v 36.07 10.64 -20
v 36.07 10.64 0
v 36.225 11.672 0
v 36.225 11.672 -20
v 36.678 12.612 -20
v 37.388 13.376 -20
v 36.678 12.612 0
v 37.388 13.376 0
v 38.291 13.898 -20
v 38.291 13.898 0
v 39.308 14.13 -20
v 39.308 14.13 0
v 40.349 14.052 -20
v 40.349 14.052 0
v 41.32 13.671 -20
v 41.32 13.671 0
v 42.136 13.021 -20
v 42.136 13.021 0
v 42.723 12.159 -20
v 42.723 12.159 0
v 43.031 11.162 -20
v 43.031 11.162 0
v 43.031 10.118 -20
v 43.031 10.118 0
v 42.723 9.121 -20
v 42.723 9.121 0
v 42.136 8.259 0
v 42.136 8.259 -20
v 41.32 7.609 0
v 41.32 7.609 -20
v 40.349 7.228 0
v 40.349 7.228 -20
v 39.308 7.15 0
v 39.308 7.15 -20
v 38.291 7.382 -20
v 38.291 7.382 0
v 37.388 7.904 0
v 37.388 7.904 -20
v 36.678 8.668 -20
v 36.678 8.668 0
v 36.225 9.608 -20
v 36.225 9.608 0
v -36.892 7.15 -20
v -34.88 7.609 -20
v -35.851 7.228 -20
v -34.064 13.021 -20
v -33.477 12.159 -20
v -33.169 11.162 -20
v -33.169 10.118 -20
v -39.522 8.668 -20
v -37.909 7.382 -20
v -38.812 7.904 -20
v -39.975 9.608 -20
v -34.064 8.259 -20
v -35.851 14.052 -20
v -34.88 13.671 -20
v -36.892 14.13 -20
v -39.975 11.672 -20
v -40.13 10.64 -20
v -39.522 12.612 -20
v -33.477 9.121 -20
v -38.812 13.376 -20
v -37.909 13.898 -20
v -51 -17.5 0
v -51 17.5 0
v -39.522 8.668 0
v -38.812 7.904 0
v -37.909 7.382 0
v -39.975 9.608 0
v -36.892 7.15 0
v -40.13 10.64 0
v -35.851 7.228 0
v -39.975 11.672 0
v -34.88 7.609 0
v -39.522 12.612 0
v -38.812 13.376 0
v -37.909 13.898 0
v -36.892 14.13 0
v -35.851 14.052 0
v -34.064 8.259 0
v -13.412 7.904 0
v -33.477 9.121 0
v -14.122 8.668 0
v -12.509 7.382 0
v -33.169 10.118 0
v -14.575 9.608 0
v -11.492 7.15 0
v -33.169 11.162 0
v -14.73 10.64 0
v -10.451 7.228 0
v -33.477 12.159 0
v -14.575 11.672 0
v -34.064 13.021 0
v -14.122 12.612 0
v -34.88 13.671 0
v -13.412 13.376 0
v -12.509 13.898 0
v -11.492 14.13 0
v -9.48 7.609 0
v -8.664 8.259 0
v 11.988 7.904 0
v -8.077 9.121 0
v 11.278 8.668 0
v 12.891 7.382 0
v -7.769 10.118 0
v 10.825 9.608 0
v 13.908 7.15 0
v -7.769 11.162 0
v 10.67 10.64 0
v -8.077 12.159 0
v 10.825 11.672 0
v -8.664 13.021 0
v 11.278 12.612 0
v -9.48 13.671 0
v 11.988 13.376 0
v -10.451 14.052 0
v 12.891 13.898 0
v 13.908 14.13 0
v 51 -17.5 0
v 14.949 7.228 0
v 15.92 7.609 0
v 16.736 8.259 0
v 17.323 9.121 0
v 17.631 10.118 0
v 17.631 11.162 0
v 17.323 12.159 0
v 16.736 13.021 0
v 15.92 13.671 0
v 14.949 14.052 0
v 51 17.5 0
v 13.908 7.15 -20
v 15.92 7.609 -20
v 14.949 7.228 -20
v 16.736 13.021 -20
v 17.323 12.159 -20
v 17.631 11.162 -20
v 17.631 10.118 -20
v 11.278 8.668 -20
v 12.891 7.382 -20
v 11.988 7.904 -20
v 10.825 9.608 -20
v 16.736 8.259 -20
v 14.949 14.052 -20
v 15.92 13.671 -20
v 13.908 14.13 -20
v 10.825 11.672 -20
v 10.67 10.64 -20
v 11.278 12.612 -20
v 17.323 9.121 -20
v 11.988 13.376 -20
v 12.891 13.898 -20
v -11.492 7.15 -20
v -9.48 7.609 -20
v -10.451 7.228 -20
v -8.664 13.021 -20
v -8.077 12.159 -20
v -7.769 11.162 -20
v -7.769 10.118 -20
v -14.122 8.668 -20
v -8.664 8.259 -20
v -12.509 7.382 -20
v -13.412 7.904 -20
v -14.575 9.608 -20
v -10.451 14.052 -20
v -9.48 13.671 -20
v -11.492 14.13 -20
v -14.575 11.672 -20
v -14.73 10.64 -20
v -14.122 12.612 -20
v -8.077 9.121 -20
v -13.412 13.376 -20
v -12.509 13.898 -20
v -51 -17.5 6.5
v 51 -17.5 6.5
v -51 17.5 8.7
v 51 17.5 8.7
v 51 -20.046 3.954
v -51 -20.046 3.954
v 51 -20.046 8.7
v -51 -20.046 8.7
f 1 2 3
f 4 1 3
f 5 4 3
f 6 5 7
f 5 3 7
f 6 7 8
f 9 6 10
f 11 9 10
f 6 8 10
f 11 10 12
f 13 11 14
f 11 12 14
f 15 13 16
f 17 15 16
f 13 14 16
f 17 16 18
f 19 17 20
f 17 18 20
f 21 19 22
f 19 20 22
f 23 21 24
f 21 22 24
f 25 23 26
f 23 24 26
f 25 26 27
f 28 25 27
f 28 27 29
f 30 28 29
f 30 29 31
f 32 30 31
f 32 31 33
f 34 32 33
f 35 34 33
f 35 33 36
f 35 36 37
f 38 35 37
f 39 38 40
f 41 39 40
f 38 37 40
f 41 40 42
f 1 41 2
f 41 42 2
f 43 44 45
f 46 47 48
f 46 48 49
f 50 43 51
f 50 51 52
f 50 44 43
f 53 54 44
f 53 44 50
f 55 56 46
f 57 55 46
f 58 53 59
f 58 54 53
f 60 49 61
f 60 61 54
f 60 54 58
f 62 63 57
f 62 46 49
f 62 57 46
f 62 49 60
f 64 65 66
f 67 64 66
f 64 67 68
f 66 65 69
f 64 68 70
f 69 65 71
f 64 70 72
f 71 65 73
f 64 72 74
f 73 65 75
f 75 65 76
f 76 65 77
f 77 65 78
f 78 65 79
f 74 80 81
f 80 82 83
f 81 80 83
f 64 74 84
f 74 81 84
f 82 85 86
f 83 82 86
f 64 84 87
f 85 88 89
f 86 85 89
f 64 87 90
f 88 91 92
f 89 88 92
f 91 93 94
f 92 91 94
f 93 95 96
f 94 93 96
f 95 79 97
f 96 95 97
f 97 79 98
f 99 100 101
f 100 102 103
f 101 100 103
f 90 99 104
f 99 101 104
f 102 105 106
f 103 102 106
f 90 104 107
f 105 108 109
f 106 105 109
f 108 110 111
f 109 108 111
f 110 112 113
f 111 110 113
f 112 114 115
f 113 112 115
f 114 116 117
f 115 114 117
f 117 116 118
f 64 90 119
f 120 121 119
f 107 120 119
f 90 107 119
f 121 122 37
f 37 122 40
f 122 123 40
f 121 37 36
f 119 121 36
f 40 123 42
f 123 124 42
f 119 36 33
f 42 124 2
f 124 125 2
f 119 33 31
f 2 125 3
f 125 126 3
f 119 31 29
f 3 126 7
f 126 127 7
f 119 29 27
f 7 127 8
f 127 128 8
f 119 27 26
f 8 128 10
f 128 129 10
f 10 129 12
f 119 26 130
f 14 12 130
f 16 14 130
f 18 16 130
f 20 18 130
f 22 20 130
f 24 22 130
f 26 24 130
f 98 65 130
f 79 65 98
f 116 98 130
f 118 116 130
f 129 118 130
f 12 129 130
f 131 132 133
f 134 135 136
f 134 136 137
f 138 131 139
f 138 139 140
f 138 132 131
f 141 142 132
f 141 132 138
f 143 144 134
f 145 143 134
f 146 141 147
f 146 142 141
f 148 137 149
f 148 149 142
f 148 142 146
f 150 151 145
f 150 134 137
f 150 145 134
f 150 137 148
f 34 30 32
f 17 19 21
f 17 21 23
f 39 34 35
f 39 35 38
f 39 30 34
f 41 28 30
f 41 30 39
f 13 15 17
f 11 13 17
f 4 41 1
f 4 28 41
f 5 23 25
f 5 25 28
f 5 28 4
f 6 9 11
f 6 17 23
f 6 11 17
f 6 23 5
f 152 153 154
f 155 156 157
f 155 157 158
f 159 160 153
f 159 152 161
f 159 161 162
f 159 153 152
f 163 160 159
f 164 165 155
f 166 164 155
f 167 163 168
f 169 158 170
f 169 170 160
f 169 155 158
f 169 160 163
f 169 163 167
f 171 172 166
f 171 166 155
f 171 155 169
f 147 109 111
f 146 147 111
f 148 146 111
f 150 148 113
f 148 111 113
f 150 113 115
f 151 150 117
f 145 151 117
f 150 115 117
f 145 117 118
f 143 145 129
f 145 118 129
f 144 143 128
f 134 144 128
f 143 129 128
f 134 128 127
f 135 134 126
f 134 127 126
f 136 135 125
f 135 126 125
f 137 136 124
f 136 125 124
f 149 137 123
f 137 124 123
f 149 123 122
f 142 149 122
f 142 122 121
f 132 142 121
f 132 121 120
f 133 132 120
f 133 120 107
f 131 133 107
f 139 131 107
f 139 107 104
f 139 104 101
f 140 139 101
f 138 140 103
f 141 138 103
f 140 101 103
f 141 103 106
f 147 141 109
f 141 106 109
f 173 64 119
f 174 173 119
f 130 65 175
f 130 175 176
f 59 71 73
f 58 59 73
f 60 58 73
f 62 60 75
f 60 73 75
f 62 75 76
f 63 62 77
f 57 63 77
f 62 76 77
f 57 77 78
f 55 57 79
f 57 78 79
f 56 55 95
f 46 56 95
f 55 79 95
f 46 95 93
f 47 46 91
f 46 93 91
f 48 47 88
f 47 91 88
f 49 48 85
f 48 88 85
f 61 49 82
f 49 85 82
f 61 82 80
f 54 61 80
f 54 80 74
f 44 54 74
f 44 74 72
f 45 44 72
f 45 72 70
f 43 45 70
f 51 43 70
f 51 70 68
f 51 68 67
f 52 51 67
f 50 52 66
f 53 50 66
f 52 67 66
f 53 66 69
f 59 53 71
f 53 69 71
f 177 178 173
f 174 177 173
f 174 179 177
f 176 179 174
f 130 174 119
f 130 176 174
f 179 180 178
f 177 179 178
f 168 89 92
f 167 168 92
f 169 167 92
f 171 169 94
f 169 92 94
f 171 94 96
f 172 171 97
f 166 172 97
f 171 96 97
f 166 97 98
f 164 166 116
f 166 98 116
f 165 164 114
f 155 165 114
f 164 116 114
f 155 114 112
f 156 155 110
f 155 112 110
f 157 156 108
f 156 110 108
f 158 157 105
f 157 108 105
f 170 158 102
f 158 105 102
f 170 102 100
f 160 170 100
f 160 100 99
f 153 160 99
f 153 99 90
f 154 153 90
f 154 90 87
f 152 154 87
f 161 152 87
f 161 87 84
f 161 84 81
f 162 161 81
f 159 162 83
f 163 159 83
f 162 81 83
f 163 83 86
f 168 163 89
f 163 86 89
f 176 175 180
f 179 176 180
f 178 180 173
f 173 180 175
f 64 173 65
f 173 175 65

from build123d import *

# Parameters (mm, degrees)
SKETCH1_W           = 102
SKETCH1_H           = 35
BOSS_EXTRUDE1_DEPTH = 8.7
BOSS_EXTRUDE2_DEPTH = 102
SKETCH5_R           = 3.5
BOSS_EXTRUDE3_DEPTH = 20


with BuildPart() as part:
    # Sketch1 → Boss-Extrude1 (new body)
    with BuildSketch(Plane.XY):
        Rectangle(SKETCH1_W, SKETCH1_H)
    extrude(amount=BOSS_EXTRUDE1_DEPTH)

    # Sketch4 → Boss-Extrude2 (add)
    with BuildSketch(Plane.ZY.offset(51)):
        Polygon((6.5, -17.5), (8.7, -17.5), (8.7, -20.045584412), (3.954415588, -20.045584412), align=None)
    extrude(amount=-BOSS_EXTRUDE2_DEPTH)

    # Sketch5 → Boss-Extrude3 (add)
    with BuildSketch(Plane(origin=(0, 0, 0), x_dir=(-1, 0, 0), z_dir=(0, 0, -1))):
        with Locations((-39.57, 10.64)):
            Circle(SKETCH5_R)
        with Locations((-14.17, 10.64)):
            Circle(SKETCH5_R)
        with Locations((11.23, 10.64)):
            Circle(SKETCH5_R)
        with Locations((36.63, 10.64)):
            Circle(SKETCH5_R)
    extrude(amount=BOSS_EXTRUDE3_DEPTH)


solid = part.part
